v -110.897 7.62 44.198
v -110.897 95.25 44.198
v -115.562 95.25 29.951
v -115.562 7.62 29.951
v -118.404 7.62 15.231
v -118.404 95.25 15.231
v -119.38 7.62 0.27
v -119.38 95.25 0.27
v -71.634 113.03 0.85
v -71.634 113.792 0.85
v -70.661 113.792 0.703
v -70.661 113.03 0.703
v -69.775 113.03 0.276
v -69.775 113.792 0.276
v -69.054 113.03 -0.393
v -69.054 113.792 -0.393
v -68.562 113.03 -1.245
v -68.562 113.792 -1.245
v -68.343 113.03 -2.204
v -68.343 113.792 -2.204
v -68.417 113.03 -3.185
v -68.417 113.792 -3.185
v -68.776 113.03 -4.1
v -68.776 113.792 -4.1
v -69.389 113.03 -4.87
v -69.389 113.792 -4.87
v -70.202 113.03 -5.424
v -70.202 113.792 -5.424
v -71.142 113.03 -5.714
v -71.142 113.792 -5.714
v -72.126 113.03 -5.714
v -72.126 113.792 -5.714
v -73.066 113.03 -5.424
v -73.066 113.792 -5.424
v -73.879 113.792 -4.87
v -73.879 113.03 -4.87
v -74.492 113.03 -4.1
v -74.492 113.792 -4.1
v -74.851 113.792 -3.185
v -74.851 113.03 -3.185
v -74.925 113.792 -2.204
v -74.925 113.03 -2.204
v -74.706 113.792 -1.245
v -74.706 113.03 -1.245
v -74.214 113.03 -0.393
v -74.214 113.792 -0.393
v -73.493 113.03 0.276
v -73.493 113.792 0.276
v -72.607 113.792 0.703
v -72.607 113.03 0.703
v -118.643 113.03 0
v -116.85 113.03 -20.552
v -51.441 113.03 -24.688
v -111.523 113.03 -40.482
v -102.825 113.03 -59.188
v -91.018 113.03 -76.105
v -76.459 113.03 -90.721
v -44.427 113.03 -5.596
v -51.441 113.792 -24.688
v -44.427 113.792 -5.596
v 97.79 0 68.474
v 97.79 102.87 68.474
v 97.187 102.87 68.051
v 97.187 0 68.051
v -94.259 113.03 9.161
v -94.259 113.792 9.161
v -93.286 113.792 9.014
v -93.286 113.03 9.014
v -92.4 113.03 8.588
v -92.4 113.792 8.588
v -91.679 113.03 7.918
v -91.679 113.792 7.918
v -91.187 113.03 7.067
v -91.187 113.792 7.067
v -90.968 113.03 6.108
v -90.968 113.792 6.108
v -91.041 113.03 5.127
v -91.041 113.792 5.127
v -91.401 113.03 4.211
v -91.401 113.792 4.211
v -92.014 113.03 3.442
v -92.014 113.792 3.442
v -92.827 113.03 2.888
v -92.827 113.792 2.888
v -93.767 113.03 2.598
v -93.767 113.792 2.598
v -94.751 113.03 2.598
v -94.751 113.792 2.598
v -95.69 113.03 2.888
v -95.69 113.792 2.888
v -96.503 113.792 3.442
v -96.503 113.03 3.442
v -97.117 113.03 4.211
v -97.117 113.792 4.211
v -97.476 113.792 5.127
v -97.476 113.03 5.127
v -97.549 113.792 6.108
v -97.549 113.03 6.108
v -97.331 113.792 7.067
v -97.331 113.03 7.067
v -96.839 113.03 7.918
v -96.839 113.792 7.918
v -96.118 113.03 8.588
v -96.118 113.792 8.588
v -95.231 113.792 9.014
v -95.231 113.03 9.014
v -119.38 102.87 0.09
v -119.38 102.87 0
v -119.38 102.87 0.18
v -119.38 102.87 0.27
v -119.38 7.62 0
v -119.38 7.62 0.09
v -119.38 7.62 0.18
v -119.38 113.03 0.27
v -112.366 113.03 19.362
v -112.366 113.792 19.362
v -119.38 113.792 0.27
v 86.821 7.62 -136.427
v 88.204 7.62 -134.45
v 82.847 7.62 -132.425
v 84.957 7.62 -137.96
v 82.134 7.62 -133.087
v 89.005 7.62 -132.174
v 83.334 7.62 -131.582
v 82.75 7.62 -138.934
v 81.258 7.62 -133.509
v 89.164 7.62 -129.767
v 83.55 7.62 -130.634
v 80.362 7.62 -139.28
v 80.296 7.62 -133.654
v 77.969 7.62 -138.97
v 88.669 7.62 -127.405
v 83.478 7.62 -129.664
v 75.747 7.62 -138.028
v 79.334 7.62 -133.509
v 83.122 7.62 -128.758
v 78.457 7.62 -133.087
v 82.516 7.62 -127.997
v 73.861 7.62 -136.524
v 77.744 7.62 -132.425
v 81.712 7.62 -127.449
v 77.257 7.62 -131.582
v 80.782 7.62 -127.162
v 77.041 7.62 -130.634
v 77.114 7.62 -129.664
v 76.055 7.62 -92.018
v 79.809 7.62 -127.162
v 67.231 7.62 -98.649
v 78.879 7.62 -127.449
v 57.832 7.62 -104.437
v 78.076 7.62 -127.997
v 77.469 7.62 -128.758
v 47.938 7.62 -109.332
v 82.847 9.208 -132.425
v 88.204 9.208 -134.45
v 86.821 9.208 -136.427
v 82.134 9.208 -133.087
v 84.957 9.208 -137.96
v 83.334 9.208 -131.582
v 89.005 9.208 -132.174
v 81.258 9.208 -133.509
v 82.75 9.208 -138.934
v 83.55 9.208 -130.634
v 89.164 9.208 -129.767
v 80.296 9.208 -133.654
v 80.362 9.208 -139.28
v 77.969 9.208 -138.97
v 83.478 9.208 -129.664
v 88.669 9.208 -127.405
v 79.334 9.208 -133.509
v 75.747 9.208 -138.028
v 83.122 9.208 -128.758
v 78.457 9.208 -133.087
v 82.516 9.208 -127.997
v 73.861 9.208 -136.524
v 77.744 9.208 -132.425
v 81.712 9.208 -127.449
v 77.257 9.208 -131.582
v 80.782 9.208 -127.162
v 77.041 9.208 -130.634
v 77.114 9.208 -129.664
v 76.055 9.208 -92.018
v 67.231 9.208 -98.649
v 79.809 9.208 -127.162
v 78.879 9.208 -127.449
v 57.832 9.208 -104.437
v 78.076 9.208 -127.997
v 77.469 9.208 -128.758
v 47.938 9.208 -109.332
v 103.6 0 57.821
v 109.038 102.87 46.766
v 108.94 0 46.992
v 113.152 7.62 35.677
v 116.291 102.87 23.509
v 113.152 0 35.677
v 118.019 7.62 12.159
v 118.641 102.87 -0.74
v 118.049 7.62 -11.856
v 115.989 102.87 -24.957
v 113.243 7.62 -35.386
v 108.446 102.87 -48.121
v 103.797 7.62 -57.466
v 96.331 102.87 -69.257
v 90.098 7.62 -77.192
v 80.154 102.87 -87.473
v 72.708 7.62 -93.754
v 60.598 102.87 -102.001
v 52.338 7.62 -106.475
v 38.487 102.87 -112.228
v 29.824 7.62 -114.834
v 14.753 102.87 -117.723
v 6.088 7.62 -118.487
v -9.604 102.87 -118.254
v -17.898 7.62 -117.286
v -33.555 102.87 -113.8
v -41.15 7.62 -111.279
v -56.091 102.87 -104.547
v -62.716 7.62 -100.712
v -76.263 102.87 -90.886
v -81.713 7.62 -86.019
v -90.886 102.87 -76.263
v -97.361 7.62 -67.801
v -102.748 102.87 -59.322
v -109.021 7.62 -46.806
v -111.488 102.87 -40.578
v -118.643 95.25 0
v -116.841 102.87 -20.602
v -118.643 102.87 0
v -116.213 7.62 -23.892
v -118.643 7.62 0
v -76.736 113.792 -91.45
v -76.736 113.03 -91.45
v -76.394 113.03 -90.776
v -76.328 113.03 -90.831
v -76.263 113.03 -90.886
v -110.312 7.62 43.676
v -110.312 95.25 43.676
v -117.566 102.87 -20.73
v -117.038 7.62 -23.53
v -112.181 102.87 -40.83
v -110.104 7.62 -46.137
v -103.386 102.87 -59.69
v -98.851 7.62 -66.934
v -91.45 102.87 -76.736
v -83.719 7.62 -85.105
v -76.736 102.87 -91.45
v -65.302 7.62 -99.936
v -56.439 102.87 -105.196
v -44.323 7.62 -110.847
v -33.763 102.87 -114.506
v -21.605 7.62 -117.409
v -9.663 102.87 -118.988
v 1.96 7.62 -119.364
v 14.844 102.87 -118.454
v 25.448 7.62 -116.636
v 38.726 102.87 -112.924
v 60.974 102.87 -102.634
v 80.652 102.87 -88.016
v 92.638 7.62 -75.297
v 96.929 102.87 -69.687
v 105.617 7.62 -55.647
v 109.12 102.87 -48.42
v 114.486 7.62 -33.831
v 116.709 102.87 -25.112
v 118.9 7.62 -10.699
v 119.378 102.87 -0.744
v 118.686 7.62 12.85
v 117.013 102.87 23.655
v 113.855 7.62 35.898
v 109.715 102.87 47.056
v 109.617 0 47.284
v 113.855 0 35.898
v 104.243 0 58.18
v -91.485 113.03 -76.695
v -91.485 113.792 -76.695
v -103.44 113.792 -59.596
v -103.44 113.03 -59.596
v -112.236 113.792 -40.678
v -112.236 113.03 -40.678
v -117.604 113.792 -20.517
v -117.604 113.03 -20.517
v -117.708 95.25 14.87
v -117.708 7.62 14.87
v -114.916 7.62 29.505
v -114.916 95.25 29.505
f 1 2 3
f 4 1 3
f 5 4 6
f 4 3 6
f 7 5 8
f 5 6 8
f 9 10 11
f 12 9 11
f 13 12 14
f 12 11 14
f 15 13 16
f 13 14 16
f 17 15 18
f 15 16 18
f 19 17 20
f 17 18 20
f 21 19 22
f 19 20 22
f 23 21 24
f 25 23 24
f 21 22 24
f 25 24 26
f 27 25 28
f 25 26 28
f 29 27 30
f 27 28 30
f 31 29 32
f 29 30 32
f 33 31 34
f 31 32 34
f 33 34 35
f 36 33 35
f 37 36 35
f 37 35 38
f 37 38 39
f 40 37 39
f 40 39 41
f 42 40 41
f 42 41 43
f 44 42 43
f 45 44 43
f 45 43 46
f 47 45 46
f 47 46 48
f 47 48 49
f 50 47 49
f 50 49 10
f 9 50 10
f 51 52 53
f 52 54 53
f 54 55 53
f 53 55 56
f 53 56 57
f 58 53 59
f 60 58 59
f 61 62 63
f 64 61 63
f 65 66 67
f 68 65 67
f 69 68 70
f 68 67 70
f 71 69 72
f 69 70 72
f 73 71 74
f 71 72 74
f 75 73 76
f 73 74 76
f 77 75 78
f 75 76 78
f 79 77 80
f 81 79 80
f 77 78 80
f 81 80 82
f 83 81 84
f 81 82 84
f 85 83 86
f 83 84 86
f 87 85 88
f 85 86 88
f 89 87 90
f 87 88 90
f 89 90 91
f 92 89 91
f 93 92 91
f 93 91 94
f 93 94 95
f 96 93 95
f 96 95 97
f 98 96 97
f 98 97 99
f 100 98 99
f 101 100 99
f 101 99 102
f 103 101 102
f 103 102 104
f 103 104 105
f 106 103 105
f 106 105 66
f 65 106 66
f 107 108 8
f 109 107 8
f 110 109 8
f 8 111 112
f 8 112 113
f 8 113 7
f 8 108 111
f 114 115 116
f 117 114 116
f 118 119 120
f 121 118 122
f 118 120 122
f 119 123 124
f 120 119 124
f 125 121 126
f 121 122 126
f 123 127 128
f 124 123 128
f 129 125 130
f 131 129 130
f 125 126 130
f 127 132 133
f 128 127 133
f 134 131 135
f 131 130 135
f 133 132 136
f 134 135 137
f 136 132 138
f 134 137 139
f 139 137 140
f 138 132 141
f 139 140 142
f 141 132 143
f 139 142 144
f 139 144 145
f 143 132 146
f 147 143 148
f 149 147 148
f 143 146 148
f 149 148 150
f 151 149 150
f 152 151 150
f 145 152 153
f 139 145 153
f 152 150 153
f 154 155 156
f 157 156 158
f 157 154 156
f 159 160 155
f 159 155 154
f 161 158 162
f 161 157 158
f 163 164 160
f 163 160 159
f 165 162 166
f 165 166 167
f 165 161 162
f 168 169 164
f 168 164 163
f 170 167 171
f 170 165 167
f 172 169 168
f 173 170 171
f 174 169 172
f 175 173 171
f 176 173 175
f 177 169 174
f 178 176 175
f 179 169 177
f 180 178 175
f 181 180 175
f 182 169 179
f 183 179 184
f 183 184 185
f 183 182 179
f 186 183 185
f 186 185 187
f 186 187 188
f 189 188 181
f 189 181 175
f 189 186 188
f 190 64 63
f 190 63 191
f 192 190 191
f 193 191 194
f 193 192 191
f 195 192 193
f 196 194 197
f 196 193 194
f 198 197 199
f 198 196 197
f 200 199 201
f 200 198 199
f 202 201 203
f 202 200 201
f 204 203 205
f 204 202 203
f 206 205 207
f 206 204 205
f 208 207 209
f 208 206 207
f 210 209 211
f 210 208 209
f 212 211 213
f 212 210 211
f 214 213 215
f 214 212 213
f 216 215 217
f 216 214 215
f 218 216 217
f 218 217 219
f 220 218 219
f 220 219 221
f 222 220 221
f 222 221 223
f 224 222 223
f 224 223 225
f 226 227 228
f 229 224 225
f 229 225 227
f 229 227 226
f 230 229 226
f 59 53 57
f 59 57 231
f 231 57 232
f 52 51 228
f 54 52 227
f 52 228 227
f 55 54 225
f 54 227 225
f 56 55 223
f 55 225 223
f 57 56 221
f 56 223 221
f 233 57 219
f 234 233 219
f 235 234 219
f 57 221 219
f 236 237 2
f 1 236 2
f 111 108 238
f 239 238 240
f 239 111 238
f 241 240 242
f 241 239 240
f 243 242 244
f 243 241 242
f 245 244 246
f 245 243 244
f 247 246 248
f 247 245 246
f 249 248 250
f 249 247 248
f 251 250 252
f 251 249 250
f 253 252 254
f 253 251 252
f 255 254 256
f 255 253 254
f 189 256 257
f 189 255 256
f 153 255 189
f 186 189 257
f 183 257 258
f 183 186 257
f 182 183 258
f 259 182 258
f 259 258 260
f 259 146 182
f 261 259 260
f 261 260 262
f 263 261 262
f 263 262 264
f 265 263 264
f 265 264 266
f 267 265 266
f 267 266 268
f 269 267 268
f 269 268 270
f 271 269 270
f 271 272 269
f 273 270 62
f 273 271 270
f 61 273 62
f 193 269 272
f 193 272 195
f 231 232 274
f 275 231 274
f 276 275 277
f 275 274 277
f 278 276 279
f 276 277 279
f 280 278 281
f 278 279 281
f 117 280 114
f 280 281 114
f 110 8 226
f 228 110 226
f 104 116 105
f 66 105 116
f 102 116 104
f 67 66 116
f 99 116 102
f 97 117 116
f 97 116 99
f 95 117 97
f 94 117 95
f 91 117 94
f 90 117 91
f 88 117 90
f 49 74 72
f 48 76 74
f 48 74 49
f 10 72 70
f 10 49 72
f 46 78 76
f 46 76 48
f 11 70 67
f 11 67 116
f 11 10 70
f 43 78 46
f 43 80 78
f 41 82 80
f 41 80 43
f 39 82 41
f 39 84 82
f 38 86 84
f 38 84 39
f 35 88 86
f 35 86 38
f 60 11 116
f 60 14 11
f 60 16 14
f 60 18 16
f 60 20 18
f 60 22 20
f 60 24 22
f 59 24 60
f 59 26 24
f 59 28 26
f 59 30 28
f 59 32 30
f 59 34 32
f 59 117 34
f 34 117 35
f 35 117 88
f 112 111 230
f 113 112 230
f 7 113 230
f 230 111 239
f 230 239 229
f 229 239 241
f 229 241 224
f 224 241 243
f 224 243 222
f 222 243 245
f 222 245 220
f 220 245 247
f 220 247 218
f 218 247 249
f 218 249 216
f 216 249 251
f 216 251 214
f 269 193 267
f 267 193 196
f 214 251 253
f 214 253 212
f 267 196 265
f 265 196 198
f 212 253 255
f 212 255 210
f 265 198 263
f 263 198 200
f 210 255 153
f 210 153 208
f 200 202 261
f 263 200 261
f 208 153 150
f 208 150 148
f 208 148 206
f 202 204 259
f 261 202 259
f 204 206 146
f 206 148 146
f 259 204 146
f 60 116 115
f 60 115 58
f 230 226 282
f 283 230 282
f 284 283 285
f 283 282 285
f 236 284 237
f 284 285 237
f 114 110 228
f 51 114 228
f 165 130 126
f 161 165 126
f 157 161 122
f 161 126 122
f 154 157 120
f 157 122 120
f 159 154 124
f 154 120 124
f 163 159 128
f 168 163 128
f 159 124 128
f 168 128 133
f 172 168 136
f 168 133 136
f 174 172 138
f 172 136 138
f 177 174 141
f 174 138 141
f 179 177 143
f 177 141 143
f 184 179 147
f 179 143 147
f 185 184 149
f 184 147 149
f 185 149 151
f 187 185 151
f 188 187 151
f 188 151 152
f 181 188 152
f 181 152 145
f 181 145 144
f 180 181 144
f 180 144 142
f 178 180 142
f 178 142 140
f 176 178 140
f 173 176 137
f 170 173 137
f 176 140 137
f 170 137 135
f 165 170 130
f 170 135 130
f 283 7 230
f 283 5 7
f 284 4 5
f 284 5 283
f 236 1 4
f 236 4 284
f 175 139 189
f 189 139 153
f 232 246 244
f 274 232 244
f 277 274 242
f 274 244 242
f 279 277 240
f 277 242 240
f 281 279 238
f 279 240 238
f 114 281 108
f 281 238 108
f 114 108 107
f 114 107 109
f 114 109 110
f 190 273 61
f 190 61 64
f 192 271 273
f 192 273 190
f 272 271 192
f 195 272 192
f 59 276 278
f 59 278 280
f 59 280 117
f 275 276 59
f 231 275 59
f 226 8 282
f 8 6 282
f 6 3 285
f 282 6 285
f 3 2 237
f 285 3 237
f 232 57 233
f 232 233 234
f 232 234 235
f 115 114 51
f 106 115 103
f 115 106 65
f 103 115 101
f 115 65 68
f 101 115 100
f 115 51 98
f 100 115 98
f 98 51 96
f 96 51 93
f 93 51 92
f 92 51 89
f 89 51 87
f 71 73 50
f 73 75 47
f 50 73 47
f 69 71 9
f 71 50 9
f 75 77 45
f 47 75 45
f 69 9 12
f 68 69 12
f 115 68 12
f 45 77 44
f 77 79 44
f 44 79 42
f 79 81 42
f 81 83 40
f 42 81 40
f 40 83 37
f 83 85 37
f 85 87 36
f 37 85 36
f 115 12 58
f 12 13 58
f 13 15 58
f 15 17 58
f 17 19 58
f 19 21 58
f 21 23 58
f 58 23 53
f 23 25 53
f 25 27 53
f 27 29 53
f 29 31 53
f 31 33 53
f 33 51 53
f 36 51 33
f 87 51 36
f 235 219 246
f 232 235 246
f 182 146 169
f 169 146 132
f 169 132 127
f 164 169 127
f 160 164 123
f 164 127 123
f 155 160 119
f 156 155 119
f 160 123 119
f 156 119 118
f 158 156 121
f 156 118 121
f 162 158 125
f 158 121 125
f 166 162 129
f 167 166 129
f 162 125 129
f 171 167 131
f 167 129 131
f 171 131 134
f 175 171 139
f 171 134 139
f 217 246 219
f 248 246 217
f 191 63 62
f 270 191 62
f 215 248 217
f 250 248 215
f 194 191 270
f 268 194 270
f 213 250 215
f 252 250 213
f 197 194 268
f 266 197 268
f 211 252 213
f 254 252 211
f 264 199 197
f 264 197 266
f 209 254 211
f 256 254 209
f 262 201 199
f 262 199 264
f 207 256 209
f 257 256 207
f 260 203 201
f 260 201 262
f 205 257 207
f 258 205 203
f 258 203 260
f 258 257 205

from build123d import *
from build123d.topology import SkipClean

# Parameters (mm, degrees)
BASE_FLANGE1_DEPTH   = 102.87
CUT_EXTRUDE1_START   = -7.62
CUT_EXTRUDE1_DEPTH   = 7.62
BOSS_EXTRUDE5_START  = -95.25
BOSS_EXTRUDE5_DEPTH  = 95.25
BOSS_EXTRUDE6_DEPTH  = 10.16
BOSS_EXTRUDE7_DEPTH  = 0.762
SKETCH12_W           = 72.378245623
SKETCH12_H           = 0.762
BOSS_EXTRUDE8_DEPTH  = 20.33854962
SKETCH13_R           = 3.3
CUT_EXTRUDE2_DEPTH   = 204.597121983
SKETCH15_R           = 3.2639
BOSS_EXTRUDE10_DEPTH = 1.5875
BOSS_EXTRUDE11_START = 17.78
BOSS_EXTRUDE11_DEPTH = 87.63


# Read off the part's stored shape, not the designer's step: Cut-Extrude1
# Sheet-metal steps are written as plain solids
with BuildPart() as part:
    # Sketch2 → Base-Flange1 (new body)
    with BuildSketch(Plane(origin=(0, 0, 0), x_dir=(1, 0, 0), z_dir=(0, 1, 0))):
        with BuildLine():
            ThreePointArc((-119.38, 0), (35.898258345, 113.85472958), (97.790371047, -68.473554972))
            Line((97.790371047, -68.473554972), (97.186983651, -68.051058569))
            ThreePointArc((97.186983651, -68.051058569), (35.676758453, 113.152221674), (-118.6434, 0))
            Line((-118.6434, 0), (-119.38, 0))
        make_face()
    extrude(amount=BASE_FLANGE1_DEPTH)

    # Cut-Extrude1 outline → Cut-Extrude1 (cut)
    with BuildSketch(Plane.XZ.offset(CUT_EXTRUDE1_START)):
        with BuildLine():
            ThreePointArc((-119.38, 0), (18.160489843, -117.990597119), (113.85472958, 35.898258345))
            Line((113.85472958, 35.898258345), (113.152221674, 35.676758453))
            ThreePointArc((113.152221674, 35.676758453), (18.048435757, -117.262570031), (-118.6434, 0))
            Line((-118.6434, 0), (-119.38, 0))
        make_face()
    extrude(amount=CUT_EXTRUDE1_DEPTH, mode=Mode.SUBTRACT)

    # Sketch9 → Boss-Extrude5 (add)
    with BuildSketch(Plane(origin=(0, 102.87, 0), x_dir=(1, 0, 0), z_dir=(0, 1, 0)).offset(BOSS_EXTRUDE5_START)):
        with BuildLine():
            Line((-119.379693576, -0.270484204), (-118.6434, 0))
            Line((-118.6434, 0), (-119.38, 0))
            ThreePointArc((-119.38, 0), (-119.379923394, -0.135242189), (-119.379693576, -0.270484204))
        make_face()
    extrude(amount=BOSS_EXTRUDE5_DEPTH)

    # Sketch10 → Boss-Extrude6 (add)
    with SkipClean():  # the faces are left unmerged after this step: merging them gives an invalid solid
        with BuildSketch(Plane(origin=(0, 102.87, 0), x_dir=(1, 0, 0), z_dir=(0, 1, 0))):
            with BuildLine():
                Line((-119.379693576, -0.270484204), (-118.6434, 0))
                ThreePointArc((-118.6434, 0), (-107.527437301, 50.140867475), (-76.262507491, 90.886117283))
                Line((-76.262507491, 90.886117283), (-76.735984844, 91.45038562))
                ThreePointArc((-76.735984844, 91.45038562), (-108.252110006, 50.329564663), (-119.379693576, -0.270484204))
            make_face()
        extrude(amount=BOSS_EXTRUDE6_DEPTH)

    # Sketch11 → Boss-Extrude7 (add)
    with SkipClean():  # the faces are left unmerged after this step: merging them gives an invalid solid
        with BuildSketch(Plane(origin=(0, 113.03, 0), x_dir=(1, 0, 0), z_dir=(0, 1, 0))):
            with BuildLine():
                Line((-119.379693576, -0.270484204), (-51.440692331, 24.687531528))
                Line((-51.440692331, 24.687531528), (-76.735984844, 91.45038562))
                ThreePointArc((-76.735984844, 91.45038562), (-108.252110006, 50.329564663), (-119.379693576, -0.270484204))
            make_face()
        extrude(amount=BOSS_EXTRUDE7_DEPTH)

    # Sketch12 → Boss-Extrude8 (add)
    with SkipClean():  # the faces are left unmerged after this step: merging them gives an invalid solid
        with BuildSketch(Plane(origin=(-14.107419738, 0, -38.402251904), x_dir=(0.9386660406079884, 0, -0.3448275862069655), z_dir=(0.3448275862069655, 0, 0.9386660406079884))):
            with Locations((-75.961811901, 113.411)):
                Rectangle(SKETCH12_W, SKETCH12_H)
        extrude(amount=BOSS_EXTRUDE8_DEPTH)

    # Sketch13 → Cut-Extrude2 (cut, through all)
    with SkipClean():  # the faces are left unmerged after this step: merging them gives an invalid solid
        with BuildSketch(Plane(origin=(0, 113.792, 0), x_dir=(1, 0, 0), z_dir=(0, 1, 0))):
            with Locations(Location((-94.258662261, -5.860928581, 0), (0, 0, 270))):
                Circle(SKETCH13_R)
            with Locations(Location((-71.633967235, 2.450493285, 0), (0, 0, 270))):
                Circle(SKETCH13_R)
        extrude(amount=-CUT_EXTRUDE2_DEPTH, mode=Mode.SUBTRACT)

    # Sketch15 → Boss-Extrude10 (add)
    with SkipClean():  # the faces are left unmerged after this step: merging them gives an invalid solid
        with BuildSketch(Plane.XZ.offset(-7.62)):
            with BuildLine():
                Line((76.054879624, -92.017605302), (88.669451617, -127.404882133))
                ThreePointArc((88.669451617, -127.404882133), (84.957156503, -137.959730204), (73.860989671, -136.524099874))
                Line((73.860989671, -136.524099874), (47.938477772, -109.332002401))
                ThreePointArc((47.938477772, -109.332002401), (62.598204897, -101.651606695), (76.054879624, -92.017605302))
            make_face()
            with Locations(Location((80.295588053, -130.389929705, 0), (0, 0, 270))):
                Circle(SKETCH15_R, mode=Mode.SUBTRACT)
        extrude(amount=-BOSS_EXTRUDE10_DEPTH)

    # Sketch16 → Boss-Extrude11 (add)
    with SkipClean():  # the faces are left unmerged after this step: merging them gives an invalid solid
        with BuildSketch(Plane.XZ.offset(-113.03).offset(BOSS_EXTRUDE11_START)):
            with BuildLine():
                Line((-119.379693576, 0.270484204), (-118.6434, 0))
                ThreePointArc((-118.6434, 0), (-116.541899203, 22.231556259), (-110.311843526, 43.675548554))
                Line((-110.311843526, 43.675548554), (-110.896860103, 44.19808615))
                ThreePointArc((-110.896860103, 44.19808615), (-117.21446731, 22.635217102), (-119.379693576, 0.270484204))
            make_face()
        extrude(amount=BOSS_EXTRUDE11_DEPTH)


solid = part.part
